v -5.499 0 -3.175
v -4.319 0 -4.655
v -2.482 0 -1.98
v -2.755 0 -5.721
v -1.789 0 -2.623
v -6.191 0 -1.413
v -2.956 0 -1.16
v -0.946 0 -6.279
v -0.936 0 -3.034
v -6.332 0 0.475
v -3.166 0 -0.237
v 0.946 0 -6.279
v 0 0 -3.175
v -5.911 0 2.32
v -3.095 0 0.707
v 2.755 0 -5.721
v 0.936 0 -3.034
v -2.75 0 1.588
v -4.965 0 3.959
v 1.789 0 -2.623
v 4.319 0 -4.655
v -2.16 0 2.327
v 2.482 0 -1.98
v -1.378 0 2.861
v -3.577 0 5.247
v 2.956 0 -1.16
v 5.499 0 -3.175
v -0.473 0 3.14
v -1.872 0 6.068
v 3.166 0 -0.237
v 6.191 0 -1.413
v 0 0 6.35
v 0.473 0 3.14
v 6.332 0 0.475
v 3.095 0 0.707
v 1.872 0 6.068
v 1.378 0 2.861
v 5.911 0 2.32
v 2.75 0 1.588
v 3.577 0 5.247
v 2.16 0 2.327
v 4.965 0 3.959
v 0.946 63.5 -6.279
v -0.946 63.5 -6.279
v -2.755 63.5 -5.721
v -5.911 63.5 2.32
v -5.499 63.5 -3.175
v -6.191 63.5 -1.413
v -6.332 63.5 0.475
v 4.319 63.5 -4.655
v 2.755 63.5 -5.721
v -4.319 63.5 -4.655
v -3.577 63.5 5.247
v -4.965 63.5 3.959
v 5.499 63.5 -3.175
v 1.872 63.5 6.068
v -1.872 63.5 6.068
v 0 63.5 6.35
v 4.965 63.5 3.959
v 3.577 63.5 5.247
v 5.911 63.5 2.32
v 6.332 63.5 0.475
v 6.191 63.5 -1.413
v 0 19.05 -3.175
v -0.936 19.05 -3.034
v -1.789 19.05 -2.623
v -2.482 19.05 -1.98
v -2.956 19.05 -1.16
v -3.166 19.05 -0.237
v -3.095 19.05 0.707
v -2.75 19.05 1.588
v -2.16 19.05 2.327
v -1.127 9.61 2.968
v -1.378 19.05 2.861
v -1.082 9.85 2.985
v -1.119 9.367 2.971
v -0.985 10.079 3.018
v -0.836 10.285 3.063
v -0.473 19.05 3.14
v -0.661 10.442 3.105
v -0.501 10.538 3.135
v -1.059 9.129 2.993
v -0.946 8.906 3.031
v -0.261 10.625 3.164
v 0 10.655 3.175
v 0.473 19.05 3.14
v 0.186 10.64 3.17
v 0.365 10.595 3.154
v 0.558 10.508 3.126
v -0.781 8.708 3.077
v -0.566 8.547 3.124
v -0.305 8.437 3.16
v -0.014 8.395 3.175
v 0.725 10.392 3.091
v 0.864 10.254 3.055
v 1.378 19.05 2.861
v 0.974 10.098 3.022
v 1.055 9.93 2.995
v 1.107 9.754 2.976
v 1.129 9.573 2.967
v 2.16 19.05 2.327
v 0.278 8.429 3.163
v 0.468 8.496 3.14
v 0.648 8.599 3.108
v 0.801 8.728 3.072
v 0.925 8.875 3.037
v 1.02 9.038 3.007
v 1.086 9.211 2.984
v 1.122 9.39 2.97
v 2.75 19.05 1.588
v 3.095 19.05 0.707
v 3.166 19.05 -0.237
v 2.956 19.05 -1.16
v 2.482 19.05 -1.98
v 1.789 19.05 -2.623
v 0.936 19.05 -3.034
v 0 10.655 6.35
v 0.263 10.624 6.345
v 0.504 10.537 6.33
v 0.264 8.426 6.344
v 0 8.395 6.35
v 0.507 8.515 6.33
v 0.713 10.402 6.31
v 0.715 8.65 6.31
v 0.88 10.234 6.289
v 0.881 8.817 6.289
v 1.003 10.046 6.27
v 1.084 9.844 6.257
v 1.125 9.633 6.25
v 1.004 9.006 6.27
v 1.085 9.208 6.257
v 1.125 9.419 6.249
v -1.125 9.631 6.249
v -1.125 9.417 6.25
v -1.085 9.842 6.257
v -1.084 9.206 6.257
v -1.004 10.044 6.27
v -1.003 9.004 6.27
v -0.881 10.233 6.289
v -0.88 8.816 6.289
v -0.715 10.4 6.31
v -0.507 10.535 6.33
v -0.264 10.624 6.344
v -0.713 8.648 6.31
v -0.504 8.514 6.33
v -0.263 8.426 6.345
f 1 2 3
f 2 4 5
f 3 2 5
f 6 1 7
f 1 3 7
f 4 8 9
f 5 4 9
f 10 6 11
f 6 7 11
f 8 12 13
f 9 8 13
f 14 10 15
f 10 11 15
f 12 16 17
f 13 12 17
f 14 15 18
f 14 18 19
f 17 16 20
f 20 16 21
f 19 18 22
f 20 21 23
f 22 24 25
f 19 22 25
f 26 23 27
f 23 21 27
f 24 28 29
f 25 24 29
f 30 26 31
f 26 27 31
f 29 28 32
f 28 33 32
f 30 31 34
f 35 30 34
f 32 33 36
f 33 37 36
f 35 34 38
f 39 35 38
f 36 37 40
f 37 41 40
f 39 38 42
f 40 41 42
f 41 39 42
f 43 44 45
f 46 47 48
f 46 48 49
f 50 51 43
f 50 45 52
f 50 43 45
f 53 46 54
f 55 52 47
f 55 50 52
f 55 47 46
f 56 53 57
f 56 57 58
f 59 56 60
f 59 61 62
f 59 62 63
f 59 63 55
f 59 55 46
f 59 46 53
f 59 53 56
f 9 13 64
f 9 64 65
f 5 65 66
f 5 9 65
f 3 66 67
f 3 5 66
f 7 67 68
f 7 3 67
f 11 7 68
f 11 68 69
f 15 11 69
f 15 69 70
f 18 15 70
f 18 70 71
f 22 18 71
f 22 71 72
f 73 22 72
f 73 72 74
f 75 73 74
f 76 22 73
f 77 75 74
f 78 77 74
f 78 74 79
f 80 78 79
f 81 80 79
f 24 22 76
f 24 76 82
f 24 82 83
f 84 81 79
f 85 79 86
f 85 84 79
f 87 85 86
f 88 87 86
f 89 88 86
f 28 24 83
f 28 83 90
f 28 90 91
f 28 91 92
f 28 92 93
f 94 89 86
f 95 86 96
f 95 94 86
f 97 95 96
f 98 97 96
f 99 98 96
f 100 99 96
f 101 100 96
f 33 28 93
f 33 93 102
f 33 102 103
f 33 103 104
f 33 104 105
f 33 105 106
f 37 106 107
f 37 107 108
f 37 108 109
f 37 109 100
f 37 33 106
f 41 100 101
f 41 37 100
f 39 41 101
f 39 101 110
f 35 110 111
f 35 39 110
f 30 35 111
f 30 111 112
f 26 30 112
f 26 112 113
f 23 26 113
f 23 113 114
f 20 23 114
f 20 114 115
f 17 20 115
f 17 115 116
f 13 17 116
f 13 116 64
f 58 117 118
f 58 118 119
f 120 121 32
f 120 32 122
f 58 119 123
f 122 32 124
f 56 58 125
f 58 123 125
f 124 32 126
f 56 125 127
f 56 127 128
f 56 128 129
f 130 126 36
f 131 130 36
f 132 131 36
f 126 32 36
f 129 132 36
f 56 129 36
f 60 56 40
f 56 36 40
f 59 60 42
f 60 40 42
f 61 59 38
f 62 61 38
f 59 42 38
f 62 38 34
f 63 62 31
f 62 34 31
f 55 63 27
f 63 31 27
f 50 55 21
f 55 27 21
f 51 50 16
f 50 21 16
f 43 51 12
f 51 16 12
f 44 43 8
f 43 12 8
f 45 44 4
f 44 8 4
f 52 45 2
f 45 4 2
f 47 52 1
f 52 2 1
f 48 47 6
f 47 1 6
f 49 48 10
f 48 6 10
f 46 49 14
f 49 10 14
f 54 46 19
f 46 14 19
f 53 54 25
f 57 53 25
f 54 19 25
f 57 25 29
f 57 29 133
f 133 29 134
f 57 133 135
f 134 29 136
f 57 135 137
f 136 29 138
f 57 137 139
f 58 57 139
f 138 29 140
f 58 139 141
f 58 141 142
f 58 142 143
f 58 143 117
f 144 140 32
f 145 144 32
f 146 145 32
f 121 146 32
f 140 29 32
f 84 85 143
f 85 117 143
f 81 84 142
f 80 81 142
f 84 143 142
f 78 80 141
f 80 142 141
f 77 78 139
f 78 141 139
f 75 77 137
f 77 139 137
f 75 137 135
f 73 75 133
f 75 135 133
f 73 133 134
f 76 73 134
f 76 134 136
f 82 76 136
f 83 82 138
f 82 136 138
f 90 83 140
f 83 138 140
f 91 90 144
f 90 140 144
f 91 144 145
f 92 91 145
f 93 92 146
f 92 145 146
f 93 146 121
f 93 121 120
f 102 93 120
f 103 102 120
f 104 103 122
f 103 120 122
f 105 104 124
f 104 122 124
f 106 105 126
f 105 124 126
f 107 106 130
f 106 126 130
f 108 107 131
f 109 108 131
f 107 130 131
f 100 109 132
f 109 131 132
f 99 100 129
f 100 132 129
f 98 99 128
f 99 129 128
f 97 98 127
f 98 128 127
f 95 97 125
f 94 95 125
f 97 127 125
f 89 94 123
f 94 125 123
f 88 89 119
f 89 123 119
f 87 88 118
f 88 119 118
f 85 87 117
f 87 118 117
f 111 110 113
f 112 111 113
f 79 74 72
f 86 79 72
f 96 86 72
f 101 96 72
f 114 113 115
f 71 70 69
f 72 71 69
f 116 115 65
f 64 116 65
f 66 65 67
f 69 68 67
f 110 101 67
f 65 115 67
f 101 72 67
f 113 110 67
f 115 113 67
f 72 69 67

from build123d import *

# Parameters (mm, degrees)
SKETCH1_R           = 6.35
BOSS_EXTRUDE1_DEPTH = 63.5
SKETCH2_R           = 3.175
CUT_EXTRUDE1_DEPTH  = 19.05
SKETCH5_W           = 1.1303
SKETCH5_H           = 6.35


with BuildPart() as part:
    # Sketch1 → Boss-Extrude1 (new body)
    with BuildSketch(Plane(origin=(0, 0, 0), x_dir=(1, 0, 0), z_dir=(0, 1, 0))):
        with Locations(Location((0, 0, 0), (0, 0, 270))):
            Circle(SKETCH1_R)
    extrude(amount=BOSS_EXTRUDE1_DEPTH)

    # Sketch2 → Cut-Extrude1 (cut)
    with BuildSketch(Plane(origin=(0, 0, 0), x_dir=(1, 0, 0), z_dir=(0, 1, 0))):
        with Locations(Location((0, 0, 0), (0, 0, 90))):
            Circle(SKETCH2_R)
    extrude(amount=CUT_EXTRUDE1_DEPTH, mode=Mode.SUBTRACT)

    # Sketch5 → #43 (0.089) Diameter Hole1 (revolve, cut)
    with BuildSketch(Plane(origin=(0, 9.525, 0), x_dir=(0, 1, 0), z_dir=(1, 0, 0))):
        with Locations((0.56515, 3.175)):
            Rectangle(SKETCH5_W, SKETCH5_H)
    revolve(axis=Axis((0, 9.525, -6.35), (0, 0, 1)), mode=Mode.SUBTRACT)


solid = part.part
